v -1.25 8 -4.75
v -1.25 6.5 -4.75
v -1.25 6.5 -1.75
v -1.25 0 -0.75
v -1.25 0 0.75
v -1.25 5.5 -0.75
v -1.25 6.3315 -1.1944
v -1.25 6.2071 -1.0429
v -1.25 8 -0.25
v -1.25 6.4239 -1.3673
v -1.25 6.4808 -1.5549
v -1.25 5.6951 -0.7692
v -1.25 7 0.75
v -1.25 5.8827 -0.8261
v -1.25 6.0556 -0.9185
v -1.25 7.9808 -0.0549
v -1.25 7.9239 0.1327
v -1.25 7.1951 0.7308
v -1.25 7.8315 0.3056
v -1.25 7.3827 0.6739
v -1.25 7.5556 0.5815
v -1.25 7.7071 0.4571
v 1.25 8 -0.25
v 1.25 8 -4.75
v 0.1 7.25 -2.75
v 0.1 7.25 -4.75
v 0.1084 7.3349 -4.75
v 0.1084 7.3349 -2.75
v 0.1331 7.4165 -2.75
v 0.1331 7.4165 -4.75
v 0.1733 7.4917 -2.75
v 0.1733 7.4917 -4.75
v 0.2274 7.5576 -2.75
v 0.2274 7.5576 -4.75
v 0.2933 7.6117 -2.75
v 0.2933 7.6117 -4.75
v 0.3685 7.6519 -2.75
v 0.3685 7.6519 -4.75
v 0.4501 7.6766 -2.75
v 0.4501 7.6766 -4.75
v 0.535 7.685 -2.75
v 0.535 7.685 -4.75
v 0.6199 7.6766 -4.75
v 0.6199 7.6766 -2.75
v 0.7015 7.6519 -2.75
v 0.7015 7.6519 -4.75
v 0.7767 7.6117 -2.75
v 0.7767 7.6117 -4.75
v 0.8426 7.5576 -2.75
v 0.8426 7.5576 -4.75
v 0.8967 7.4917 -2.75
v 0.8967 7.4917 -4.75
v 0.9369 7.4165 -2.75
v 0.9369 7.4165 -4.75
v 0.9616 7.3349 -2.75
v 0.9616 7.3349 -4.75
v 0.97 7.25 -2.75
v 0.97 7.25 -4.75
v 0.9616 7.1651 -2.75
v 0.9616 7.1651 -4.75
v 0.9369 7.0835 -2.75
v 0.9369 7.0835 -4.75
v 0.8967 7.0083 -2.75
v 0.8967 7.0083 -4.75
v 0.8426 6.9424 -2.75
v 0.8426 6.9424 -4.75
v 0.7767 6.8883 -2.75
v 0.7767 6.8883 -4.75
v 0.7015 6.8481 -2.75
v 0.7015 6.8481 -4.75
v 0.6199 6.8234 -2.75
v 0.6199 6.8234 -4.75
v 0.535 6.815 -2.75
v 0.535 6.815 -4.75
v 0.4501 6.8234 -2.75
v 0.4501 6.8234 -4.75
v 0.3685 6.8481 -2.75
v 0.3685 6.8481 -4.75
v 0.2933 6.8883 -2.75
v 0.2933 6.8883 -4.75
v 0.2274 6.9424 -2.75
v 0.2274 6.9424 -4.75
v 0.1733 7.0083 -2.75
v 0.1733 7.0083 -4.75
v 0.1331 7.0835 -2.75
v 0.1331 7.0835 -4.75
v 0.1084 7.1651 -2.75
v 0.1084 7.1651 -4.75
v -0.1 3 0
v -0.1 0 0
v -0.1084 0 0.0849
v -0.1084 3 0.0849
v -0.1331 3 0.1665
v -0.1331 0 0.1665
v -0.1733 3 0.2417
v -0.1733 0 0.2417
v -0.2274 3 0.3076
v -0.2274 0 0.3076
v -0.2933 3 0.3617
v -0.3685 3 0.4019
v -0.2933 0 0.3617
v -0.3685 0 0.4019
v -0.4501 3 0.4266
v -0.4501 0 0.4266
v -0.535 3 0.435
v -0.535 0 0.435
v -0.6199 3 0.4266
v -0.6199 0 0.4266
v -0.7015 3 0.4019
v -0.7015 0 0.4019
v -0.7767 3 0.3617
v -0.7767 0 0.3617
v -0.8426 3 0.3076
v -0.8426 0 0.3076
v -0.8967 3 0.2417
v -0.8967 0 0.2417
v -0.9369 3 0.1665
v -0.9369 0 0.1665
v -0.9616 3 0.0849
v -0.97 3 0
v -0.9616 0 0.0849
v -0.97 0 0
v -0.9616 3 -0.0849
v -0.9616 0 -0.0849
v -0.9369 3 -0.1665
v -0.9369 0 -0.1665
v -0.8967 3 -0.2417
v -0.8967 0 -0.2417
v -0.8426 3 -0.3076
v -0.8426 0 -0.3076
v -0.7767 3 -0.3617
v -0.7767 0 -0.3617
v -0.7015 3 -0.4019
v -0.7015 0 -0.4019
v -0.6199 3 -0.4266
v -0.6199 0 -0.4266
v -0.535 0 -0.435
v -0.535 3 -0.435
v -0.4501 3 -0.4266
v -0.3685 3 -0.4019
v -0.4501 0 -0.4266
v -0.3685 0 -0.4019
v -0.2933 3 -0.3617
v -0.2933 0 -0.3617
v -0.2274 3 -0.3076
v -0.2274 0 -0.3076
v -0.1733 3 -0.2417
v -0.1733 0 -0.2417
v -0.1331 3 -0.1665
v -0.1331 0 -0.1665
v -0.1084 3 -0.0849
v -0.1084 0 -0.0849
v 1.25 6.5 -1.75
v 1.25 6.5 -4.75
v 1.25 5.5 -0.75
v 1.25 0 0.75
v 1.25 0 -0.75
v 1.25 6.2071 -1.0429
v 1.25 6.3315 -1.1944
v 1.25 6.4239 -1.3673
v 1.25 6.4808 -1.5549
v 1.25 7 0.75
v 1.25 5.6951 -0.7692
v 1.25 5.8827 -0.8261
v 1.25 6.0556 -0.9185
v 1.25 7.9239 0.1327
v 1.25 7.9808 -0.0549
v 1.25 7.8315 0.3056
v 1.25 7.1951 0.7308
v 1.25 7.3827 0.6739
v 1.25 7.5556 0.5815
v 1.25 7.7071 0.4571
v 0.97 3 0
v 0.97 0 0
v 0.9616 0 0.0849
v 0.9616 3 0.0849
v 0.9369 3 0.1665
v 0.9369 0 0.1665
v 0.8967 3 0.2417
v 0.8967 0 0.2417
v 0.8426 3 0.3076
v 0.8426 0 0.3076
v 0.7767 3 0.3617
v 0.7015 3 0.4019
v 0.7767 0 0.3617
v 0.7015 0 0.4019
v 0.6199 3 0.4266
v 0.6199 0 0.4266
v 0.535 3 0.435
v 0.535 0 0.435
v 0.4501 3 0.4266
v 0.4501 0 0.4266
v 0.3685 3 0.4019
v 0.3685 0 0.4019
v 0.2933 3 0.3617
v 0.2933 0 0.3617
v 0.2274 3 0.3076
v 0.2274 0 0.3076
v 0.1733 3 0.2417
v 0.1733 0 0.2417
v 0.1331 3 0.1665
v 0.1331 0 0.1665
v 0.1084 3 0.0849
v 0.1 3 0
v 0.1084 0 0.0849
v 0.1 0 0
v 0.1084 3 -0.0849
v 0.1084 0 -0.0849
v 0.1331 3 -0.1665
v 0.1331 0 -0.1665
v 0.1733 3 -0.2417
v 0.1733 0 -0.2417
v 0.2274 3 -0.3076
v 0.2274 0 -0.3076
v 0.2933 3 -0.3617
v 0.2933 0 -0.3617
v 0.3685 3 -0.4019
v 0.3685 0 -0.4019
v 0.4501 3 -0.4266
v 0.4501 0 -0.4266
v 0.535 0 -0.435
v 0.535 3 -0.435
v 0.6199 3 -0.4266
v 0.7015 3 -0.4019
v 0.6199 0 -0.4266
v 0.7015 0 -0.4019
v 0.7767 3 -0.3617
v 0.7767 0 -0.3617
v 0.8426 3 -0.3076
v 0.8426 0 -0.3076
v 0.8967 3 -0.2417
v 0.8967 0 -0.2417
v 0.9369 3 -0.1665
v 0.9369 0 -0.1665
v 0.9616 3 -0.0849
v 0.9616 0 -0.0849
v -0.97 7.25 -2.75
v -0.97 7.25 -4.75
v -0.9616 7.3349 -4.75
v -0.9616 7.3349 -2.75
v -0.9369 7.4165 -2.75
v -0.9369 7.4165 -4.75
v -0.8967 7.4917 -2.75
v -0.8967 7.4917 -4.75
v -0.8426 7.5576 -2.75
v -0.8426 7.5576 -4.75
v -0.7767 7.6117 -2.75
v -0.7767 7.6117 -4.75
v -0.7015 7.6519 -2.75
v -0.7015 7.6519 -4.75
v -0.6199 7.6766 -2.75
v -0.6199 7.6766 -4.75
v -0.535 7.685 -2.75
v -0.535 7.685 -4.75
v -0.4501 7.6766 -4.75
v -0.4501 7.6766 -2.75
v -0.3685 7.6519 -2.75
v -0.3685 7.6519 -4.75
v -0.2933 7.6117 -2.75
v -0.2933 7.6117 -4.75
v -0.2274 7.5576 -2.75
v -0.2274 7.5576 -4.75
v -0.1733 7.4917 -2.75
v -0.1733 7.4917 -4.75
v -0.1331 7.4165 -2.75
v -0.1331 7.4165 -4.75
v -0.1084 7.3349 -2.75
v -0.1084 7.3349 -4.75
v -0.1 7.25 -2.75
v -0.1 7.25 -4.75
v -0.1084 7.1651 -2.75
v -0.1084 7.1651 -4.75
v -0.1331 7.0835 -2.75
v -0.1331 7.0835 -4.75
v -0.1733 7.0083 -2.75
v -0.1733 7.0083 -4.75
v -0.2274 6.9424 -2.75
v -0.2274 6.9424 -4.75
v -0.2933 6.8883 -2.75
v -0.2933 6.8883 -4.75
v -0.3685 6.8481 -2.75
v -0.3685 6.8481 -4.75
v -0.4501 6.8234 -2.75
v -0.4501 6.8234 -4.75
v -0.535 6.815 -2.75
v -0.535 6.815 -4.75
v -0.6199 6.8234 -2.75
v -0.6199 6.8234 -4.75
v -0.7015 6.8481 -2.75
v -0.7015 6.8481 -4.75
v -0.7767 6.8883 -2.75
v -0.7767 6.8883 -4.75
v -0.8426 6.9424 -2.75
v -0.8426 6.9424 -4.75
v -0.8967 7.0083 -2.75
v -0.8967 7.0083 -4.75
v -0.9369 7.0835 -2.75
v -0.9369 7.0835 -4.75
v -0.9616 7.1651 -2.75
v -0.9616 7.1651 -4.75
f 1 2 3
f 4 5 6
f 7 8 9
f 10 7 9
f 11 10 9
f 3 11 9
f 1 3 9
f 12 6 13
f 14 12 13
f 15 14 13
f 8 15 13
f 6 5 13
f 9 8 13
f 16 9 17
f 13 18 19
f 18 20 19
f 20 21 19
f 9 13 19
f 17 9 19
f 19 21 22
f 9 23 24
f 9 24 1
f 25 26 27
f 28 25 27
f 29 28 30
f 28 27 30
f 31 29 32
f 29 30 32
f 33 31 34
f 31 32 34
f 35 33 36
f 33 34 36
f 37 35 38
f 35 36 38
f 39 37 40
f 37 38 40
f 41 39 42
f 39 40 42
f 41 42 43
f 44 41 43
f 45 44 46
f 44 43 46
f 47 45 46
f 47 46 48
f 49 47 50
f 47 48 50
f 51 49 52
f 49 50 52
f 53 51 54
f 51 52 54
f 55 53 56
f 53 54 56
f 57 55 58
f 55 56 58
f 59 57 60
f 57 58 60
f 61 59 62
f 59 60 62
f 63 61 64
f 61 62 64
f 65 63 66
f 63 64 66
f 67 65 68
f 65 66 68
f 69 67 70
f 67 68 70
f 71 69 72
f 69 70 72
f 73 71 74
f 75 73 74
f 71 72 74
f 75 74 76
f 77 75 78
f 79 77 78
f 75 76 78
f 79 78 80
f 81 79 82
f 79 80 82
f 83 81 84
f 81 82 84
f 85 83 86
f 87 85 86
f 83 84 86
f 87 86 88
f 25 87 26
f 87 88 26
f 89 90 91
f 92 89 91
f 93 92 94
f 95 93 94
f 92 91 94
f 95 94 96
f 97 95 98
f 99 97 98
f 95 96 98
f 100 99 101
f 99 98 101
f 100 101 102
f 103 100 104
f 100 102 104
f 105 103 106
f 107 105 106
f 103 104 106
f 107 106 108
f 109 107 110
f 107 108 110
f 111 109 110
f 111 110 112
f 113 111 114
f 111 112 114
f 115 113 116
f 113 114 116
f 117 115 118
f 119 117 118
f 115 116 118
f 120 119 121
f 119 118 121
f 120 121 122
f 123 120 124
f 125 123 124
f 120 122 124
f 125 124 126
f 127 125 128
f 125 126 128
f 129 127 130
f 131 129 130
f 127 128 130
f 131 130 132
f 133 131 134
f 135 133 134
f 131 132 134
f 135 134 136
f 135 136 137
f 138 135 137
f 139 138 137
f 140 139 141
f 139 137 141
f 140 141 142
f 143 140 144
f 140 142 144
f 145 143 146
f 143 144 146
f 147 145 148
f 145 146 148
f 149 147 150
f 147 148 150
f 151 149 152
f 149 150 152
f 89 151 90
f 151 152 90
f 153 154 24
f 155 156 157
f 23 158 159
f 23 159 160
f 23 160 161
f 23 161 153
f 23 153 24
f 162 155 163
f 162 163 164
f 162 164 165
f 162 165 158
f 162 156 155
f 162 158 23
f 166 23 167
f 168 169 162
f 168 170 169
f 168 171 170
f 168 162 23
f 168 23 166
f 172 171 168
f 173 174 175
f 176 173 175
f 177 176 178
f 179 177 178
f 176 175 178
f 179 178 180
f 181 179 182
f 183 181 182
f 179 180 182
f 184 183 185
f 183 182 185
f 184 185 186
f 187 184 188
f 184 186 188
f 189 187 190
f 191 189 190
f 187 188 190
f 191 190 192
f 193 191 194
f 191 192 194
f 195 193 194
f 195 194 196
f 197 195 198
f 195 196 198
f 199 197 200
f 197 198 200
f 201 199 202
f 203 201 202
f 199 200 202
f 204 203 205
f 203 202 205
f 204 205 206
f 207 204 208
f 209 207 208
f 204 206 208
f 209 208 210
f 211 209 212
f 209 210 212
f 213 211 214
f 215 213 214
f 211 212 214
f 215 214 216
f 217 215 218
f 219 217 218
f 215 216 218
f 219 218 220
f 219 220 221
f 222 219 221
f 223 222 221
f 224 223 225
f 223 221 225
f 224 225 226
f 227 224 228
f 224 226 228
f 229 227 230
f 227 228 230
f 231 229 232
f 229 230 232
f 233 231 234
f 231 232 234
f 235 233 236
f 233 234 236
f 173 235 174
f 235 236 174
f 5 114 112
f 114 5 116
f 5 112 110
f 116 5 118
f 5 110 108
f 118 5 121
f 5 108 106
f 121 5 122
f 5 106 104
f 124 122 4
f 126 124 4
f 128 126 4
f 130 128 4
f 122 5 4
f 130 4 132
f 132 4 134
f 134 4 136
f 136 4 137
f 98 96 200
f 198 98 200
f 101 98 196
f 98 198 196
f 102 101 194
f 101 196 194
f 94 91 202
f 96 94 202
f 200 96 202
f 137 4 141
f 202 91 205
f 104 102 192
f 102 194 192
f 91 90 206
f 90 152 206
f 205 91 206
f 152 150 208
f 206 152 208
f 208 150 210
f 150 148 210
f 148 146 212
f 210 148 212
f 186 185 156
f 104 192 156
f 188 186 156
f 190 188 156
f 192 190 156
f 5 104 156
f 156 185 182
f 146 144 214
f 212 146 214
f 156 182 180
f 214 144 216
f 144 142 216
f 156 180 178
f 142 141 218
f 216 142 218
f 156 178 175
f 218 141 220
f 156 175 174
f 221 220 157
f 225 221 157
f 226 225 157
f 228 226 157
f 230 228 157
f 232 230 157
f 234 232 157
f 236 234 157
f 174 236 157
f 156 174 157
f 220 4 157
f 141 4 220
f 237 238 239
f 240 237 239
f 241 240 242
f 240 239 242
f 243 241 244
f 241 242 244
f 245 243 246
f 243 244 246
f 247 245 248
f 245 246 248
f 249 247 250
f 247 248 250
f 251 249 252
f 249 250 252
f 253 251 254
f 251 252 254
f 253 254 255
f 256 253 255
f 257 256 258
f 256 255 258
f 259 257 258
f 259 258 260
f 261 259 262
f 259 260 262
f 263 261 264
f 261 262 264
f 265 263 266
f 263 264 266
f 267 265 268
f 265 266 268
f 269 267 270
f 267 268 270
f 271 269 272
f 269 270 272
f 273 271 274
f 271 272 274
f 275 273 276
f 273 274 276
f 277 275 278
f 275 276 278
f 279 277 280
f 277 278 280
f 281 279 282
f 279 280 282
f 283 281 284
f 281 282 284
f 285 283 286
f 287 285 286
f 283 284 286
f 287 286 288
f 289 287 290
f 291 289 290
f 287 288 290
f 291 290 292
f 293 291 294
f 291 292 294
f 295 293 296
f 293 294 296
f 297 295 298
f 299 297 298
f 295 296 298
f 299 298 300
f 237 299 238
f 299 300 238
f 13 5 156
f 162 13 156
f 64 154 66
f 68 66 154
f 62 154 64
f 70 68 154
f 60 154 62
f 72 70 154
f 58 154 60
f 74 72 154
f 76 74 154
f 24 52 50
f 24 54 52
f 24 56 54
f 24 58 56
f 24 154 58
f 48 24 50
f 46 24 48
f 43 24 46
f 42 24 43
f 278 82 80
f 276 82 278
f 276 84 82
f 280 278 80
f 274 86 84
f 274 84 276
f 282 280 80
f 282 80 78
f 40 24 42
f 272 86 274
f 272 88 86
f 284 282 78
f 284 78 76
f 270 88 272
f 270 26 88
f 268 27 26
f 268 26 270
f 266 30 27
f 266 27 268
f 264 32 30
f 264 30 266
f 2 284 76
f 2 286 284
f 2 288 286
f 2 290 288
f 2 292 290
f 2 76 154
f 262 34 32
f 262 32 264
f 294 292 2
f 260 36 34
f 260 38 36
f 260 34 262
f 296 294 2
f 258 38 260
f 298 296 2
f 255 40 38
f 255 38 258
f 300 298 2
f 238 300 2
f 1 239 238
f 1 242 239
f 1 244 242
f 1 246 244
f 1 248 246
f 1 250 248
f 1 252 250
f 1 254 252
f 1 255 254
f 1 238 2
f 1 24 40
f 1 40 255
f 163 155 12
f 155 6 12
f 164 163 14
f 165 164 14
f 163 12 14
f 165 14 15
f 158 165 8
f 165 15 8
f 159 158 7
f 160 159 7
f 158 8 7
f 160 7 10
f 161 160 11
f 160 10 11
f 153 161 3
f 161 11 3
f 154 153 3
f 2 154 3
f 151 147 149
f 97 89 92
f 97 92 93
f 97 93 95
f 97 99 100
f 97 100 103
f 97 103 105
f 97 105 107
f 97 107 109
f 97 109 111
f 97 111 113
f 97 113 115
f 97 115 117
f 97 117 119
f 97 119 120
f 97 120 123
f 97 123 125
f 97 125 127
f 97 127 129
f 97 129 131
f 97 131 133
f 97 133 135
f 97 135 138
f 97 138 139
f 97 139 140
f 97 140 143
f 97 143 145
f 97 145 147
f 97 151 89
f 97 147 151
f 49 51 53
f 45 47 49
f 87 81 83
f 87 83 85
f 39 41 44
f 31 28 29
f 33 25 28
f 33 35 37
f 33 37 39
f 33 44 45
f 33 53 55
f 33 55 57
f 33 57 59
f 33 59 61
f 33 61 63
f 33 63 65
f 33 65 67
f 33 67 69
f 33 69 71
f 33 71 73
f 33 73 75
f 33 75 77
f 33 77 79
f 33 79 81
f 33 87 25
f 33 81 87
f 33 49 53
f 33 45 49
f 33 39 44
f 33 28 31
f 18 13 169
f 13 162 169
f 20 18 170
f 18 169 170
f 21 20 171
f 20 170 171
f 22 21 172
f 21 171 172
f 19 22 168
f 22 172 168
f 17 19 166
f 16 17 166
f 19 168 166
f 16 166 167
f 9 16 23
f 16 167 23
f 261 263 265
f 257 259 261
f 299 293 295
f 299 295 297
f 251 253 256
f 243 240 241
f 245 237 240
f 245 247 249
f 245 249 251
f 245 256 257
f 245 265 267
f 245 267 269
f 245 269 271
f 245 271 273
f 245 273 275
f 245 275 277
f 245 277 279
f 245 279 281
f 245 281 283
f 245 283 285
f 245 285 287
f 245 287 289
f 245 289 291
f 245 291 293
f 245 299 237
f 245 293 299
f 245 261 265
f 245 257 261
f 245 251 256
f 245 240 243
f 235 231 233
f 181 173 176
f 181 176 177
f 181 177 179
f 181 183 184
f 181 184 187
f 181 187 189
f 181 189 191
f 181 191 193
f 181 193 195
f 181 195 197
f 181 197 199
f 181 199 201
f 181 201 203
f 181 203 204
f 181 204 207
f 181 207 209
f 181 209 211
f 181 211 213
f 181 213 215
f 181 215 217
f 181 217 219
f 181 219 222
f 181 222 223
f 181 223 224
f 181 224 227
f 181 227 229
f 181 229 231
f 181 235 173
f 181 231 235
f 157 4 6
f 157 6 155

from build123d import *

# Parameters (mm, degrees)
SKETCH_1_W          = 2.5
SKETCH_1_H          = 1.5
EXTRUDE_1_DEPTH     = 8
SKETCH_5_R          = 0.435
CUT_EXTRUDE_1_DEPTH = 3
SKETCH_6_W          = 2.5
SKETCH_6_H          = 1.5
EXTRUDE_2_DEPTH     = 4
FILLET_1_R          = 1
SKETCH_7_R          = 0.435
CUT_EXTRUDE_2_DEPTH = 2


with BuildPart() as part:
    # Эскиз1 → Бобышка-Вытянуть1 (new body)
    with BuildSketch(Plane(origin=(0, 0, 0), x_dir=(1, 0, 0), z_dir=(0, 1, 0))):
        Rectangle(SKETCH_1_W, SKETCH_1_H)
    extrude(amount=EXTRUDE_1_DEPTH)

    # Эскиз5 → Вырез-Вытянуть1 (cut)
    with BuildSketch(Plane.XZ):
        with Locations((0.535, 0)):
            Circle(SKETCH_5_R)
        with Locations((-0.535, 0)):
            Circle(SKETCH_5_R)
    extrude(amount=-CUT_EXTRUDE_1_DEPTH, mode=Mode.SUBTRACT)

    # Эскиз6 → Бобышка-Вытянуть2 (add)
    with BuildSketch(Plane(origin=(0, 0, -0.75), x_dir=(-1, 0, 0), z_dir=(0, 0, -1))):
        with Locations((0, 7.25)):
            Rectangle(SKETCH_6_W, SKETCH_6_H)
    extrude(amount=EXTRUDE_2_DEPTH)

    # Скругление1
    fillet_1_edges = [part.edges().sort_by_distance(p)[0] for p in [
        (0, 8, 0.75),
        (0, 6.5, -0.75),
    ]]
    fillet(fillet_1_edges, radius=FILLET_1_R)

    # Эскиз7 → Вырез-Вытянуть2 (cut)
    with BuildSketch(Plane(origin=(0, 0, -4.75), x_dir=(-1, 0, 0), z_dir=(0, 0, -1))):
        with Locations((-0.535, 7.25)):
            Circle(SKETCH_7_R)
        with Locations((0.535, 7.25)):
            Circle(SKETCH_7_R)
    extrude(amount=-CUT_EXTRUDE_2_DEPTH, mode=Mode.SUBTRACT)


solid = part.part
